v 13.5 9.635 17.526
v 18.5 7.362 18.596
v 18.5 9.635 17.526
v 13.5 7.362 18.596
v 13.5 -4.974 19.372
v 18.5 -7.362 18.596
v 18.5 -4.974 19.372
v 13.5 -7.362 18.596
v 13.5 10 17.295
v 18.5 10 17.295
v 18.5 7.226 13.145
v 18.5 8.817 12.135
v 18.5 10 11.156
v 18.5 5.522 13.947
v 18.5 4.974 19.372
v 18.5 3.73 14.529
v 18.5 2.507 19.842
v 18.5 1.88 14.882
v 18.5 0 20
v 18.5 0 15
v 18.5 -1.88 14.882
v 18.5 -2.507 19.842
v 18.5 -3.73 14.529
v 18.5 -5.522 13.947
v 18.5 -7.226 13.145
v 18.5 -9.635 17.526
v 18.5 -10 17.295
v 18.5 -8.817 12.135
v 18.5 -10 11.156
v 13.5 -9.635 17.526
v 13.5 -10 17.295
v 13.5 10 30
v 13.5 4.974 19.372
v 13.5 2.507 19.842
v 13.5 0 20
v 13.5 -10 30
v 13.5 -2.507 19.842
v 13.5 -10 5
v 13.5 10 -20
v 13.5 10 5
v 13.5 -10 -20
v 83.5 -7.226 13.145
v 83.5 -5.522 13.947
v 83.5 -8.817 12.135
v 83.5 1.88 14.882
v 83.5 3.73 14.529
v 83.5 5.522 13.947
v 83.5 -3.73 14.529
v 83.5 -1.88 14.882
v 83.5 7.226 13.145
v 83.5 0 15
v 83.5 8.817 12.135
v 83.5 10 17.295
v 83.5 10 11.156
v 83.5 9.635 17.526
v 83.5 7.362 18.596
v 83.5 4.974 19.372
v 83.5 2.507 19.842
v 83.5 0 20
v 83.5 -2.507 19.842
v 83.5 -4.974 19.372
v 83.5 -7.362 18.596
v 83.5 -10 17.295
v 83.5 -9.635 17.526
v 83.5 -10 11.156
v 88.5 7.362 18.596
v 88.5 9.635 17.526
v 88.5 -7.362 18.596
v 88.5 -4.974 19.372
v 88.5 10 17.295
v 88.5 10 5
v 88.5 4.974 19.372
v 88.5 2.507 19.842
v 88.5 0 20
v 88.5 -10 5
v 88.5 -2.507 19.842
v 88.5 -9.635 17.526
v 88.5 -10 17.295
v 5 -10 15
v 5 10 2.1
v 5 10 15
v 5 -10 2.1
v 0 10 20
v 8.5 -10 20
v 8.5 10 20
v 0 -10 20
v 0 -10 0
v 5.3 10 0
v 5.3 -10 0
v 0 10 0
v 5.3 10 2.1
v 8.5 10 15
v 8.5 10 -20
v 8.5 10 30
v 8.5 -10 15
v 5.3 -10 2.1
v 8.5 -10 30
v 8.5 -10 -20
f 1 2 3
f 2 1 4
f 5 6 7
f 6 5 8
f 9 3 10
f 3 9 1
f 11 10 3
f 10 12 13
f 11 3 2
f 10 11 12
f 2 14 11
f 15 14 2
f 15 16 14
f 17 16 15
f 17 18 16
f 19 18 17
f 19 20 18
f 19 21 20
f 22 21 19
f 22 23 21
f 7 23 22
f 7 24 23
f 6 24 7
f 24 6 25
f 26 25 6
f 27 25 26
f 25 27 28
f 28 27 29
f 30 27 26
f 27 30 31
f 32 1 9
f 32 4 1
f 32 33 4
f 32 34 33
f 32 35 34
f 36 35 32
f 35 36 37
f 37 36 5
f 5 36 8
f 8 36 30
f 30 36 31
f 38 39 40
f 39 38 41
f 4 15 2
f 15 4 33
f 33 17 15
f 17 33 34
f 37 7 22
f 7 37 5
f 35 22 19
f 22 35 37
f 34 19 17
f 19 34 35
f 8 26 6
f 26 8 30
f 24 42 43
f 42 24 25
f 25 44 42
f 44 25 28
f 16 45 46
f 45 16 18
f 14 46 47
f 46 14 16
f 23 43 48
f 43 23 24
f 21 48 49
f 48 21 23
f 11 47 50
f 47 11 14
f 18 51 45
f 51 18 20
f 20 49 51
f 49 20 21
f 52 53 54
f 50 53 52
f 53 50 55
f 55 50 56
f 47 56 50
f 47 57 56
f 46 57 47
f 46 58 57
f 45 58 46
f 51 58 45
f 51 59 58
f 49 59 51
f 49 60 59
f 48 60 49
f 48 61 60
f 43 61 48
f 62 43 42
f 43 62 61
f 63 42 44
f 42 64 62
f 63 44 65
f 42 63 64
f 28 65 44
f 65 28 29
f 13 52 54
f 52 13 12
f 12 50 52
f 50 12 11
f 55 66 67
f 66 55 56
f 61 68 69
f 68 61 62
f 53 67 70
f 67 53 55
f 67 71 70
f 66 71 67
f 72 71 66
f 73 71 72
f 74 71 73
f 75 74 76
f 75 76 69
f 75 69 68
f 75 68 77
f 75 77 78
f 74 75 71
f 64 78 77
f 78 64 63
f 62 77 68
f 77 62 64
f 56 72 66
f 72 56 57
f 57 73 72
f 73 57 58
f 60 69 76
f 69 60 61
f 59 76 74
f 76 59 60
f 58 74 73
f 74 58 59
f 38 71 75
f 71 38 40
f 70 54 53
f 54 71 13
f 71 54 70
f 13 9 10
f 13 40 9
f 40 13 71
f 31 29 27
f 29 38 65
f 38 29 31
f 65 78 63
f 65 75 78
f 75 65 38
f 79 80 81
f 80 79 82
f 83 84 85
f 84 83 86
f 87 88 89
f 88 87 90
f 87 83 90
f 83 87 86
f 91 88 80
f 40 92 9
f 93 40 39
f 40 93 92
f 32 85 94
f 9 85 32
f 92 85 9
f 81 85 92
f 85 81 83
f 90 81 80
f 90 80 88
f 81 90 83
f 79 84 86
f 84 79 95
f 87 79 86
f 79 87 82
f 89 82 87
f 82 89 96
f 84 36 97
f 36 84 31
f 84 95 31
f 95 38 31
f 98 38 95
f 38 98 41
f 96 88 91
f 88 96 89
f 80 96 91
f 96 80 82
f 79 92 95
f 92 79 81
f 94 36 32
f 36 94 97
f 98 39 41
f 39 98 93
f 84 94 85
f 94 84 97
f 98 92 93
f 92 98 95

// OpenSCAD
$fn=50;
spool_length=65;
sheet_thickness=3.5;
spool_saver=5;
cylinder_dia=30;
bottom_projection=50;
top_projection=15;
inner_projection=20;
offset=5;
tightener=0.3;

translate([0,-cylinder_dia/2+offset,cylinder_dia/2-inner_projection+offset])
    cube([spool_saver,cylinder_dia-offset*2,inner_projection]);

translate([spool_saver,-cylinder_dia/2+offset,cylinder_dia/2-inner_projection+offset])
    cube([tightener,cylinder_dia-offset*2,tightener*sheet_thickness*2]);

translate([0,-cylinder_dia/2+offset,+cylinder_dia/2])
    cube([sheet_thickness+spool_saver*2,cylinder_dia-offset*2,offset]);

translate([sheet_thickness+spool_saver,-cylinder_dia/2+offset,top_projection-bottom_projection+cylinder_dia/2])
    cube([spool_saver,cylinder_dia-offset*2,bottom_projection]);

difference()
{
translate([spool_saver+sheet_thickness+spool_saver,0,0])
rotate([0,90,0])
{
    cylinder(h=spool_saver, r=spool_saver+cylinder_dia/2);
    translate([0,0,spool_saver])
    cylinder(h=spool_length,r=cylinder_dia/2);
    translate([0,0,spool_length+spool_saver])
    cylinder(h=spool_saver, r=spool_saver+cylinder_dia/2);
}

translate([spool_saver+sheet_thickness+spool_saver,-cylinder_dia,-cylinder_dia+offset])
    cube([spool_length+spool_saver*2+offset,cylinder_dia*2, cylinder_dia]);

translate([spool_saver+sheet_thickness+spool_saver-offset/2,cylinder_dia/2-offset,-cylinder_dia])
    cube([spool_length+spool_saver*2+offset,cylinder_dia, cylinder_dia*2]);

translate([spool_saver+sheet_thickness+spool_saver-offset/2,-cylinder_dia-cylinder_dia/2+offset,-cylinder_dia])
    cube([spool_length+spool_saver*2+offset,cylinder_dia, cylinder_dia*2]);
}
